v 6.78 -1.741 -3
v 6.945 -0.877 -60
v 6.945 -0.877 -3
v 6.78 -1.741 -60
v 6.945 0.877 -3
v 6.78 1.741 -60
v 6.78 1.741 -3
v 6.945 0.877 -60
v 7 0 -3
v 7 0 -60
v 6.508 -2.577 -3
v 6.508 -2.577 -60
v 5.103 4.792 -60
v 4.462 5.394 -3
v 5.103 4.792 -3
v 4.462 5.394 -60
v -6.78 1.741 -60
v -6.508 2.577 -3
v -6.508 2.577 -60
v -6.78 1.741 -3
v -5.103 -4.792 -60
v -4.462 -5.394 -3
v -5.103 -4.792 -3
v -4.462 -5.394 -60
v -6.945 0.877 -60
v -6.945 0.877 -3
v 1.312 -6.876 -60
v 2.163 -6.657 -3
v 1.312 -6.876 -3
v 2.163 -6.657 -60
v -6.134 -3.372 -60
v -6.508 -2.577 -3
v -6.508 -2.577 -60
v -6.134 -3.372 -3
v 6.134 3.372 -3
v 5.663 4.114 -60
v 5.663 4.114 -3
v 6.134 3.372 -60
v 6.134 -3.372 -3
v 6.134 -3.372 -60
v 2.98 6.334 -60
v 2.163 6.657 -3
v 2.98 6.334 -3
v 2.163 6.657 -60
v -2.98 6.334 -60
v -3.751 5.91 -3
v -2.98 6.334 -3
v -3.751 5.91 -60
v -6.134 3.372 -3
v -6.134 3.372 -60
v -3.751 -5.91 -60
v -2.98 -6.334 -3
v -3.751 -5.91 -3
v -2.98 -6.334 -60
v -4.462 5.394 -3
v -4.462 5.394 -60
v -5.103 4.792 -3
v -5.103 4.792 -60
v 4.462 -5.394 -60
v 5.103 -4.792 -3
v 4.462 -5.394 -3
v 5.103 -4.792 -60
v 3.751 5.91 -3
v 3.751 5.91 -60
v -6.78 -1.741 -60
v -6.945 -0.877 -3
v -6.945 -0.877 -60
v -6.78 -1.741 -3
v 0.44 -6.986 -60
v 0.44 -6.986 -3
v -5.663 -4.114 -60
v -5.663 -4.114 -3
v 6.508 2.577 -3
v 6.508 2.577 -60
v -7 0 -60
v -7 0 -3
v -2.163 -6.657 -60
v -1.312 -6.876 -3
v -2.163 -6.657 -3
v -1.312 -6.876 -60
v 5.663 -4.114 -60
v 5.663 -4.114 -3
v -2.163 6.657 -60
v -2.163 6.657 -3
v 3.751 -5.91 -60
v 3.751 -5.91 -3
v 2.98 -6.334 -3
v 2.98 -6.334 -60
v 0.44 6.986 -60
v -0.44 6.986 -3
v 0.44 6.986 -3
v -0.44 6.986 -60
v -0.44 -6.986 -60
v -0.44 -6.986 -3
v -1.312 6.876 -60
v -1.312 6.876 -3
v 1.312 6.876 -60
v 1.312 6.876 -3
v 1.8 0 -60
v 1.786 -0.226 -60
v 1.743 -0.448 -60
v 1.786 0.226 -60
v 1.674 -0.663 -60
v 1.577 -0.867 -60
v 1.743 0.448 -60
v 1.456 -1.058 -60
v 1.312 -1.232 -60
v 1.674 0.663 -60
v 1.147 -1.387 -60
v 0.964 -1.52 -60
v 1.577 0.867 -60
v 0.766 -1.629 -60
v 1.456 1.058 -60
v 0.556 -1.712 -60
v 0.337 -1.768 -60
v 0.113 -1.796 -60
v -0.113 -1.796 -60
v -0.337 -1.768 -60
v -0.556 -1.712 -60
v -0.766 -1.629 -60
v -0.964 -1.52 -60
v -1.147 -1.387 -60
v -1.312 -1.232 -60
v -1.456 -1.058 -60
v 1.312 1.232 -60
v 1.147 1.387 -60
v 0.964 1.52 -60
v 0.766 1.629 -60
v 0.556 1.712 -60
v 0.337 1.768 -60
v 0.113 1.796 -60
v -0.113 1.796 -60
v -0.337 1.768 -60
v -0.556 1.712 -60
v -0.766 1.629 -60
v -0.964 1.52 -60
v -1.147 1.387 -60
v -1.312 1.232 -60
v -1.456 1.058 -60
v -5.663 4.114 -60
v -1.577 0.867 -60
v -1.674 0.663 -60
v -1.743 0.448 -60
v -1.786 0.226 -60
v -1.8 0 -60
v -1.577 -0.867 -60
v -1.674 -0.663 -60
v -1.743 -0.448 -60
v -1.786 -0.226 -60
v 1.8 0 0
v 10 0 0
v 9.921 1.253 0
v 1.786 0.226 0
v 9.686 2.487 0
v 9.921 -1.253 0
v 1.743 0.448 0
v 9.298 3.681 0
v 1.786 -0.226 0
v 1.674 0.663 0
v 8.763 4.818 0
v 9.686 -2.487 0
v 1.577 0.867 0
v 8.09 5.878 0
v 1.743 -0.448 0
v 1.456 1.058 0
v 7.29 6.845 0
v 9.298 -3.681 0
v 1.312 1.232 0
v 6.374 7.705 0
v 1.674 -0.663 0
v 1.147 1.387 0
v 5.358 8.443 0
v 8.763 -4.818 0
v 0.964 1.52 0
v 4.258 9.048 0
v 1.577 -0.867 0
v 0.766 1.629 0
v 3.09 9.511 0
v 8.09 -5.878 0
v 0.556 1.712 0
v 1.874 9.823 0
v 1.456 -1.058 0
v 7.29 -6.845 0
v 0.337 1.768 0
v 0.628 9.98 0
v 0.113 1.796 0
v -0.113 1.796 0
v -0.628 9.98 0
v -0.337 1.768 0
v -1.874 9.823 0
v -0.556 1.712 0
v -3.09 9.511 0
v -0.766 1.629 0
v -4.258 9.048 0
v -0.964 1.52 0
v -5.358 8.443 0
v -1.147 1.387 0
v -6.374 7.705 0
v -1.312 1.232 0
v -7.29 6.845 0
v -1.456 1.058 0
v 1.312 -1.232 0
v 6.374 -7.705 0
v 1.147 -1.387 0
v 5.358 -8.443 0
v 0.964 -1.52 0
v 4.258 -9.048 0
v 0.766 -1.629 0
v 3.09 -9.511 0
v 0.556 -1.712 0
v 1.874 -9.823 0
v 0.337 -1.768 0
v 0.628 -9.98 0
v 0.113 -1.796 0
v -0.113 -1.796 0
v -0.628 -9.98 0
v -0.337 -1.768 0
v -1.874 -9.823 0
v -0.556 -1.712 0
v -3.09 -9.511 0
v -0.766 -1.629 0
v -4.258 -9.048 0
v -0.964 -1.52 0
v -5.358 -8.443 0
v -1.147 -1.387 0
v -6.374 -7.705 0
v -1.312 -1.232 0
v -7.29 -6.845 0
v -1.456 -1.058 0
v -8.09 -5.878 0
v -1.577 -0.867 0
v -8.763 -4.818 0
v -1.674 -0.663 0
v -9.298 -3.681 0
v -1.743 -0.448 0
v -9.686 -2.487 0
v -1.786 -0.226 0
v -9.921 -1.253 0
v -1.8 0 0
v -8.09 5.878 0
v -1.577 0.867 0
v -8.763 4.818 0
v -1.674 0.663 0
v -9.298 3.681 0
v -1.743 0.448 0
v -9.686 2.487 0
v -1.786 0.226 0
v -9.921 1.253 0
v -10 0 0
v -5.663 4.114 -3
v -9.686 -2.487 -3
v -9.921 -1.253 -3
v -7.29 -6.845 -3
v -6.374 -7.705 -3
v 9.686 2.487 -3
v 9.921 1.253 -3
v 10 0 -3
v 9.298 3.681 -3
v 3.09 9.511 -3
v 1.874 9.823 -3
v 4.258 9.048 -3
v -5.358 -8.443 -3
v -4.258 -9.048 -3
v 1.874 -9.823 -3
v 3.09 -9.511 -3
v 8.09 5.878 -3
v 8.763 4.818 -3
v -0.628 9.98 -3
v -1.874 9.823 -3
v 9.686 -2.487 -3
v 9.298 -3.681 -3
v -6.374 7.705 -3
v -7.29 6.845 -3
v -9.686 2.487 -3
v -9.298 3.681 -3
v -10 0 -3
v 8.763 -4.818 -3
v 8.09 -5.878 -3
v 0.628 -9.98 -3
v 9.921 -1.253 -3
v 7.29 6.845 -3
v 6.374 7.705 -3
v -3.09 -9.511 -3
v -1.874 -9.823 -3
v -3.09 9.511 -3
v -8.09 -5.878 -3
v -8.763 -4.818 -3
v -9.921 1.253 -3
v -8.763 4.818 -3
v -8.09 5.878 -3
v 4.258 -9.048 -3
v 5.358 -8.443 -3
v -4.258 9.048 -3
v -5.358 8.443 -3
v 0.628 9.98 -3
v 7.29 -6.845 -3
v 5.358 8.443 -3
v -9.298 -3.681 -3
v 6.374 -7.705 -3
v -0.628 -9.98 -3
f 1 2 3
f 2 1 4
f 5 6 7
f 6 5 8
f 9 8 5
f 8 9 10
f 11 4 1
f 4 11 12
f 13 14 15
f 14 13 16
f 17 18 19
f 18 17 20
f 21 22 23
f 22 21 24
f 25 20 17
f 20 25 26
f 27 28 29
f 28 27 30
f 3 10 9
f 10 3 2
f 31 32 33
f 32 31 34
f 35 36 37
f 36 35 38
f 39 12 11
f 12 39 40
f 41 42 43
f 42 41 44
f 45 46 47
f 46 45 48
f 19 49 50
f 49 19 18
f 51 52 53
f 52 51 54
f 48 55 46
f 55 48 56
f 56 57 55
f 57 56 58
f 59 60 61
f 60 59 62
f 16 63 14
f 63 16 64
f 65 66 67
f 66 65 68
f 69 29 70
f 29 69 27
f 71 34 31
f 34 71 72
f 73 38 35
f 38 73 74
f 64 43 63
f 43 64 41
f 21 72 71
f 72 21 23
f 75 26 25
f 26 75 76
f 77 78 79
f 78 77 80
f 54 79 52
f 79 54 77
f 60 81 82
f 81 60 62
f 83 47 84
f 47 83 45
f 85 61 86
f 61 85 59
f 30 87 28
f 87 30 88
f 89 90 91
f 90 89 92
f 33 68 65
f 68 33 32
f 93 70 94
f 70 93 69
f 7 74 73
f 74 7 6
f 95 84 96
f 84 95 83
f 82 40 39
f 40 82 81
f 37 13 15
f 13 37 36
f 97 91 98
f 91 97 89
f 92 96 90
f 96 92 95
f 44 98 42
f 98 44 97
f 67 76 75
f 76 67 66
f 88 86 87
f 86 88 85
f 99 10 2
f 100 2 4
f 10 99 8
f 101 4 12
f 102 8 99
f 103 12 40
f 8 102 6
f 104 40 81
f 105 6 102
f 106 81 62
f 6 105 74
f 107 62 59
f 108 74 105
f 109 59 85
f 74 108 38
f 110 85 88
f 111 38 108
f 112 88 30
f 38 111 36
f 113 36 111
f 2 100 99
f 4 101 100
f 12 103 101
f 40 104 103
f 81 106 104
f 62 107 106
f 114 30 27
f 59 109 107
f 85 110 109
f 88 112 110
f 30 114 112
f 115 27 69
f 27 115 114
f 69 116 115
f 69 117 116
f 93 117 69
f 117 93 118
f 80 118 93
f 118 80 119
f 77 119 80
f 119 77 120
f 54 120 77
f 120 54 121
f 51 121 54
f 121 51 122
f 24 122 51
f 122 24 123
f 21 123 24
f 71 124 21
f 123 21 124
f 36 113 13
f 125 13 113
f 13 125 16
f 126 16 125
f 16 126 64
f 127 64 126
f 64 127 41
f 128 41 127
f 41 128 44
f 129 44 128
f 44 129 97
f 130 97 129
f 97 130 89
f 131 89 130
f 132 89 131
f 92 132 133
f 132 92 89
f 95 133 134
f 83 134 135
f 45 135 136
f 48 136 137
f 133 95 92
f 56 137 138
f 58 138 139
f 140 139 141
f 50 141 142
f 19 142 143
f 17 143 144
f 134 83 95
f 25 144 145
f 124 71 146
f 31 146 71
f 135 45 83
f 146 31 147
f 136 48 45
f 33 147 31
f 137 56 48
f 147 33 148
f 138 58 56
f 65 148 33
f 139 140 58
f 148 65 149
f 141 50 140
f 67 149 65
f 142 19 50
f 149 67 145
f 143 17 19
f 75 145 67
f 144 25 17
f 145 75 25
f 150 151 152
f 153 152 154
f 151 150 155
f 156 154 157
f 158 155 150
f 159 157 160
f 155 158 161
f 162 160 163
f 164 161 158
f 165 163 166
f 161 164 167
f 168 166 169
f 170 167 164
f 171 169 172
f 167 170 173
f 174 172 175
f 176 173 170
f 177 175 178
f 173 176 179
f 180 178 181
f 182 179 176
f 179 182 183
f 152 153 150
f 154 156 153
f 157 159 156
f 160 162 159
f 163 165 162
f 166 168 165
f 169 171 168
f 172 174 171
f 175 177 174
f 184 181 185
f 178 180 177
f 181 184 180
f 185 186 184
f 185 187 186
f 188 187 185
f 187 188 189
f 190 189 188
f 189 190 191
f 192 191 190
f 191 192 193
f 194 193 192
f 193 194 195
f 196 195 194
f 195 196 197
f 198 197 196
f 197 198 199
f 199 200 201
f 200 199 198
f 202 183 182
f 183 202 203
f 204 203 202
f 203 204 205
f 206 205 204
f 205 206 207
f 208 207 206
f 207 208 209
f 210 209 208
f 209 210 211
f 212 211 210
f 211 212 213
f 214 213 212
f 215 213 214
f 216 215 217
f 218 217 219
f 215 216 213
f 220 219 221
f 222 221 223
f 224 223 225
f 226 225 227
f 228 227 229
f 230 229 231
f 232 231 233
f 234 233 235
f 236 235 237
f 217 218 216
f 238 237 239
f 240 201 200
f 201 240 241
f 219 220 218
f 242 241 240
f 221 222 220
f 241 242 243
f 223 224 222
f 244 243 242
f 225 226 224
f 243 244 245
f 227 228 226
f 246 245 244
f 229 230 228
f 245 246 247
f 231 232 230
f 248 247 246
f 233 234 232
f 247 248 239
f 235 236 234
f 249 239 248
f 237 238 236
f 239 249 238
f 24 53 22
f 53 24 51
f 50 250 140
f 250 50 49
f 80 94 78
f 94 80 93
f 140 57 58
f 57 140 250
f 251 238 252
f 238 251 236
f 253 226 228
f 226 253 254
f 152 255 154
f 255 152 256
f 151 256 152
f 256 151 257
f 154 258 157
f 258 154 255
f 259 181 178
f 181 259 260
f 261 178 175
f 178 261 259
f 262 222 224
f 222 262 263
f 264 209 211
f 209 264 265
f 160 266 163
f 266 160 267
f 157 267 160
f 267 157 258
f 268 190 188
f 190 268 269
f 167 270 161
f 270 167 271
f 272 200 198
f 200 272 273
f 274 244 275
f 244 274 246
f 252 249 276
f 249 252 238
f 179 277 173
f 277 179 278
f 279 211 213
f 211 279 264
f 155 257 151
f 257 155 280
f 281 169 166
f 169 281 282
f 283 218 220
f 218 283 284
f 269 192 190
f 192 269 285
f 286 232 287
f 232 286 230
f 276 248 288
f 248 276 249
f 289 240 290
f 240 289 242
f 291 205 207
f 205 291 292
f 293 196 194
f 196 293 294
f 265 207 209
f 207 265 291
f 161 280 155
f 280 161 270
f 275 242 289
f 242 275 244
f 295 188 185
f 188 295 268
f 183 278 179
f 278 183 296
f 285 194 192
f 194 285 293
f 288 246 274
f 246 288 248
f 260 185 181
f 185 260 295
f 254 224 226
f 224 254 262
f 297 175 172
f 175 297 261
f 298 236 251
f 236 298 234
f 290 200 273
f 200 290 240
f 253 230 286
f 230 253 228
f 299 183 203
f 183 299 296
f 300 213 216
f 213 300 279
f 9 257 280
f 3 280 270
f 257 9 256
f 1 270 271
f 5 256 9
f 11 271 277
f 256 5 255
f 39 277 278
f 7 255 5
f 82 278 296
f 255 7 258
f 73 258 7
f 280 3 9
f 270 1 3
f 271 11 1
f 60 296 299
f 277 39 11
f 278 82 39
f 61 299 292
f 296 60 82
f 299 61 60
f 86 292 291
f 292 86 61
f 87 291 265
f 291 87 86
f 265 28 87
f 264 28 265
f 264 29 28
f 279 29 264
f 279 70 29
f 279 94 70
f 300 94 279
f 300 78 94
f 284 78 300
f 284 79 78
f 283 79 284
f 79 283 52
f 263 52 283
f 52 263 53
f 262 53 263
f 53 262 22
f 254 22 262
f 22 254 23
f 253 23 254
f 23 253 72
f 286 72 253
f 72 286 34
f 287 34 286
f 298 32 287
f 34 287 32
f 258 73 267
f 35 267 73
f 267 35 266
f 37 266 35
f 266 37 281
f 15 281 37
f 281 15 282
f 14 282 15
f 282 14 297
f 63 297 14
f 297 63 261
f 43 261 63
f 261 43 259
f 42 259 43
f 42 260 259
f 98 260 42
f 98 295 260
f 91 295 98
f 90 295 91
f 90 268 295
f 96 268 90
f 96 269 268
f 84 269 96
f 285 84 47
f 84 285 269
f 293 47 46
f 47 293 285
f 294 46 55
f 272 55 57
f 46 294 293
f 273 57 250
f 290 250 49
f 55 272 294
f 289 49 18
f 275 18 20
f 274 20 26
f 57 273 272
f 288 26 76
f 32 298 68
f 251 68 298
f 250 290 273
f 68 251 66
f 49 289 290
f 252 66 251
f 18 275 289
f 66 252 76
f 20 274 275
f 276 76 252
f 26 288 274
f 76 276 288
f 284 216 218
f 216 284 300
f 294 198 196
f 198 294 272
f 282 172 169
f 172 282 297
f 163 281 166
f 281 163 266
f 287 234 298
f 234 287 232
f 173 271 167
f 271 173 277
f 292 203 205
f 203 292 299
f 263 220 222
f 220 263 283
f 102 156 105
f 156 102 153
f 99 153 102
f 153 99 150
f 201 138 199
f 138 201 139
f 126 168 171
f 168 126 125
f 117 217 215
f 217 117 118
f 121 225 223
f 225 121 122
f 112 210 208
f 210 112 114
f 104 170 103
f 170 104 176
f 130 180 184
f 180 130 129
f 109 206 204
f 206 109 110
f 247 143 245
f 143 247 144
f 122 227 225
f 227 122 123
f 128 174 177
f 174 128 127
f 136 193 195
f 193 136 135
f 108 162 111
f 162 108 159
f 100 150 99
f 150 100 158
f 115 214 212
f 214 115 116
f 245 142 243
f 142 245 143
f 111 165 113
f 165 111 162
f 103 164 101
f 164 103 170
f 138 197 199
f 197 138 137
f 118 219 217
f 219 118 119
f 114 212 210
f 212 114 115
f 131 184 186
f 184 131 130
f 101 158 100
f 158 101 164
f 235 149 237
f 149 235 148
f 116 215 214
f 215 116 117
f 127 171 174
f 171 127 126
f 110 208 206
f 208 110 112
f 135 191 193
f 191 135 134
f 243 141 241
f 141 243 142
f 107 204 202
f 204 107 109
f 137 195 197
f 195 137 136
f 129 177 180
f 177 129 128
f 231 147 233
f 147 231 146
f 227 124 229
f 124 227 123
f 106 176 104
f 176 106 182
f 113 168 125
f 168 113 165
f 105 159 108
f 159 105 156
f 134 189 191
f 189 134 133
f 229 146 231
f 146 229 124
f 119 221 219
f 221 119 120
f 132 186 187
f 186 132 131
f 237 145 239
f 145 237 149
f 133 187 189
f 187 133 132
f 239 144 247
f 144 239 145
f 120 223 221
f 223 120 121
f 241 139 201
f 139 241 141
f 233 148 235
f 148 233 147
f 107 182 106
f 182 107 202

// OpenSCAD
$fn = 50;


difference() {
	union() {
		translate(v = [0, 0, -60.0000000000]) {
			cylinder(h = 60, r = 7.0000000000);
		}
		translate(v = [0, 0, -3.0000000000]) {
			cylinder(h = 3, r = 10.0000000000);
		}
	}
	union() {
		#translate(v = [0, 0, -60]) {
			cylinder(h = 60, r = 1.8000000000);
		}
	}
}
